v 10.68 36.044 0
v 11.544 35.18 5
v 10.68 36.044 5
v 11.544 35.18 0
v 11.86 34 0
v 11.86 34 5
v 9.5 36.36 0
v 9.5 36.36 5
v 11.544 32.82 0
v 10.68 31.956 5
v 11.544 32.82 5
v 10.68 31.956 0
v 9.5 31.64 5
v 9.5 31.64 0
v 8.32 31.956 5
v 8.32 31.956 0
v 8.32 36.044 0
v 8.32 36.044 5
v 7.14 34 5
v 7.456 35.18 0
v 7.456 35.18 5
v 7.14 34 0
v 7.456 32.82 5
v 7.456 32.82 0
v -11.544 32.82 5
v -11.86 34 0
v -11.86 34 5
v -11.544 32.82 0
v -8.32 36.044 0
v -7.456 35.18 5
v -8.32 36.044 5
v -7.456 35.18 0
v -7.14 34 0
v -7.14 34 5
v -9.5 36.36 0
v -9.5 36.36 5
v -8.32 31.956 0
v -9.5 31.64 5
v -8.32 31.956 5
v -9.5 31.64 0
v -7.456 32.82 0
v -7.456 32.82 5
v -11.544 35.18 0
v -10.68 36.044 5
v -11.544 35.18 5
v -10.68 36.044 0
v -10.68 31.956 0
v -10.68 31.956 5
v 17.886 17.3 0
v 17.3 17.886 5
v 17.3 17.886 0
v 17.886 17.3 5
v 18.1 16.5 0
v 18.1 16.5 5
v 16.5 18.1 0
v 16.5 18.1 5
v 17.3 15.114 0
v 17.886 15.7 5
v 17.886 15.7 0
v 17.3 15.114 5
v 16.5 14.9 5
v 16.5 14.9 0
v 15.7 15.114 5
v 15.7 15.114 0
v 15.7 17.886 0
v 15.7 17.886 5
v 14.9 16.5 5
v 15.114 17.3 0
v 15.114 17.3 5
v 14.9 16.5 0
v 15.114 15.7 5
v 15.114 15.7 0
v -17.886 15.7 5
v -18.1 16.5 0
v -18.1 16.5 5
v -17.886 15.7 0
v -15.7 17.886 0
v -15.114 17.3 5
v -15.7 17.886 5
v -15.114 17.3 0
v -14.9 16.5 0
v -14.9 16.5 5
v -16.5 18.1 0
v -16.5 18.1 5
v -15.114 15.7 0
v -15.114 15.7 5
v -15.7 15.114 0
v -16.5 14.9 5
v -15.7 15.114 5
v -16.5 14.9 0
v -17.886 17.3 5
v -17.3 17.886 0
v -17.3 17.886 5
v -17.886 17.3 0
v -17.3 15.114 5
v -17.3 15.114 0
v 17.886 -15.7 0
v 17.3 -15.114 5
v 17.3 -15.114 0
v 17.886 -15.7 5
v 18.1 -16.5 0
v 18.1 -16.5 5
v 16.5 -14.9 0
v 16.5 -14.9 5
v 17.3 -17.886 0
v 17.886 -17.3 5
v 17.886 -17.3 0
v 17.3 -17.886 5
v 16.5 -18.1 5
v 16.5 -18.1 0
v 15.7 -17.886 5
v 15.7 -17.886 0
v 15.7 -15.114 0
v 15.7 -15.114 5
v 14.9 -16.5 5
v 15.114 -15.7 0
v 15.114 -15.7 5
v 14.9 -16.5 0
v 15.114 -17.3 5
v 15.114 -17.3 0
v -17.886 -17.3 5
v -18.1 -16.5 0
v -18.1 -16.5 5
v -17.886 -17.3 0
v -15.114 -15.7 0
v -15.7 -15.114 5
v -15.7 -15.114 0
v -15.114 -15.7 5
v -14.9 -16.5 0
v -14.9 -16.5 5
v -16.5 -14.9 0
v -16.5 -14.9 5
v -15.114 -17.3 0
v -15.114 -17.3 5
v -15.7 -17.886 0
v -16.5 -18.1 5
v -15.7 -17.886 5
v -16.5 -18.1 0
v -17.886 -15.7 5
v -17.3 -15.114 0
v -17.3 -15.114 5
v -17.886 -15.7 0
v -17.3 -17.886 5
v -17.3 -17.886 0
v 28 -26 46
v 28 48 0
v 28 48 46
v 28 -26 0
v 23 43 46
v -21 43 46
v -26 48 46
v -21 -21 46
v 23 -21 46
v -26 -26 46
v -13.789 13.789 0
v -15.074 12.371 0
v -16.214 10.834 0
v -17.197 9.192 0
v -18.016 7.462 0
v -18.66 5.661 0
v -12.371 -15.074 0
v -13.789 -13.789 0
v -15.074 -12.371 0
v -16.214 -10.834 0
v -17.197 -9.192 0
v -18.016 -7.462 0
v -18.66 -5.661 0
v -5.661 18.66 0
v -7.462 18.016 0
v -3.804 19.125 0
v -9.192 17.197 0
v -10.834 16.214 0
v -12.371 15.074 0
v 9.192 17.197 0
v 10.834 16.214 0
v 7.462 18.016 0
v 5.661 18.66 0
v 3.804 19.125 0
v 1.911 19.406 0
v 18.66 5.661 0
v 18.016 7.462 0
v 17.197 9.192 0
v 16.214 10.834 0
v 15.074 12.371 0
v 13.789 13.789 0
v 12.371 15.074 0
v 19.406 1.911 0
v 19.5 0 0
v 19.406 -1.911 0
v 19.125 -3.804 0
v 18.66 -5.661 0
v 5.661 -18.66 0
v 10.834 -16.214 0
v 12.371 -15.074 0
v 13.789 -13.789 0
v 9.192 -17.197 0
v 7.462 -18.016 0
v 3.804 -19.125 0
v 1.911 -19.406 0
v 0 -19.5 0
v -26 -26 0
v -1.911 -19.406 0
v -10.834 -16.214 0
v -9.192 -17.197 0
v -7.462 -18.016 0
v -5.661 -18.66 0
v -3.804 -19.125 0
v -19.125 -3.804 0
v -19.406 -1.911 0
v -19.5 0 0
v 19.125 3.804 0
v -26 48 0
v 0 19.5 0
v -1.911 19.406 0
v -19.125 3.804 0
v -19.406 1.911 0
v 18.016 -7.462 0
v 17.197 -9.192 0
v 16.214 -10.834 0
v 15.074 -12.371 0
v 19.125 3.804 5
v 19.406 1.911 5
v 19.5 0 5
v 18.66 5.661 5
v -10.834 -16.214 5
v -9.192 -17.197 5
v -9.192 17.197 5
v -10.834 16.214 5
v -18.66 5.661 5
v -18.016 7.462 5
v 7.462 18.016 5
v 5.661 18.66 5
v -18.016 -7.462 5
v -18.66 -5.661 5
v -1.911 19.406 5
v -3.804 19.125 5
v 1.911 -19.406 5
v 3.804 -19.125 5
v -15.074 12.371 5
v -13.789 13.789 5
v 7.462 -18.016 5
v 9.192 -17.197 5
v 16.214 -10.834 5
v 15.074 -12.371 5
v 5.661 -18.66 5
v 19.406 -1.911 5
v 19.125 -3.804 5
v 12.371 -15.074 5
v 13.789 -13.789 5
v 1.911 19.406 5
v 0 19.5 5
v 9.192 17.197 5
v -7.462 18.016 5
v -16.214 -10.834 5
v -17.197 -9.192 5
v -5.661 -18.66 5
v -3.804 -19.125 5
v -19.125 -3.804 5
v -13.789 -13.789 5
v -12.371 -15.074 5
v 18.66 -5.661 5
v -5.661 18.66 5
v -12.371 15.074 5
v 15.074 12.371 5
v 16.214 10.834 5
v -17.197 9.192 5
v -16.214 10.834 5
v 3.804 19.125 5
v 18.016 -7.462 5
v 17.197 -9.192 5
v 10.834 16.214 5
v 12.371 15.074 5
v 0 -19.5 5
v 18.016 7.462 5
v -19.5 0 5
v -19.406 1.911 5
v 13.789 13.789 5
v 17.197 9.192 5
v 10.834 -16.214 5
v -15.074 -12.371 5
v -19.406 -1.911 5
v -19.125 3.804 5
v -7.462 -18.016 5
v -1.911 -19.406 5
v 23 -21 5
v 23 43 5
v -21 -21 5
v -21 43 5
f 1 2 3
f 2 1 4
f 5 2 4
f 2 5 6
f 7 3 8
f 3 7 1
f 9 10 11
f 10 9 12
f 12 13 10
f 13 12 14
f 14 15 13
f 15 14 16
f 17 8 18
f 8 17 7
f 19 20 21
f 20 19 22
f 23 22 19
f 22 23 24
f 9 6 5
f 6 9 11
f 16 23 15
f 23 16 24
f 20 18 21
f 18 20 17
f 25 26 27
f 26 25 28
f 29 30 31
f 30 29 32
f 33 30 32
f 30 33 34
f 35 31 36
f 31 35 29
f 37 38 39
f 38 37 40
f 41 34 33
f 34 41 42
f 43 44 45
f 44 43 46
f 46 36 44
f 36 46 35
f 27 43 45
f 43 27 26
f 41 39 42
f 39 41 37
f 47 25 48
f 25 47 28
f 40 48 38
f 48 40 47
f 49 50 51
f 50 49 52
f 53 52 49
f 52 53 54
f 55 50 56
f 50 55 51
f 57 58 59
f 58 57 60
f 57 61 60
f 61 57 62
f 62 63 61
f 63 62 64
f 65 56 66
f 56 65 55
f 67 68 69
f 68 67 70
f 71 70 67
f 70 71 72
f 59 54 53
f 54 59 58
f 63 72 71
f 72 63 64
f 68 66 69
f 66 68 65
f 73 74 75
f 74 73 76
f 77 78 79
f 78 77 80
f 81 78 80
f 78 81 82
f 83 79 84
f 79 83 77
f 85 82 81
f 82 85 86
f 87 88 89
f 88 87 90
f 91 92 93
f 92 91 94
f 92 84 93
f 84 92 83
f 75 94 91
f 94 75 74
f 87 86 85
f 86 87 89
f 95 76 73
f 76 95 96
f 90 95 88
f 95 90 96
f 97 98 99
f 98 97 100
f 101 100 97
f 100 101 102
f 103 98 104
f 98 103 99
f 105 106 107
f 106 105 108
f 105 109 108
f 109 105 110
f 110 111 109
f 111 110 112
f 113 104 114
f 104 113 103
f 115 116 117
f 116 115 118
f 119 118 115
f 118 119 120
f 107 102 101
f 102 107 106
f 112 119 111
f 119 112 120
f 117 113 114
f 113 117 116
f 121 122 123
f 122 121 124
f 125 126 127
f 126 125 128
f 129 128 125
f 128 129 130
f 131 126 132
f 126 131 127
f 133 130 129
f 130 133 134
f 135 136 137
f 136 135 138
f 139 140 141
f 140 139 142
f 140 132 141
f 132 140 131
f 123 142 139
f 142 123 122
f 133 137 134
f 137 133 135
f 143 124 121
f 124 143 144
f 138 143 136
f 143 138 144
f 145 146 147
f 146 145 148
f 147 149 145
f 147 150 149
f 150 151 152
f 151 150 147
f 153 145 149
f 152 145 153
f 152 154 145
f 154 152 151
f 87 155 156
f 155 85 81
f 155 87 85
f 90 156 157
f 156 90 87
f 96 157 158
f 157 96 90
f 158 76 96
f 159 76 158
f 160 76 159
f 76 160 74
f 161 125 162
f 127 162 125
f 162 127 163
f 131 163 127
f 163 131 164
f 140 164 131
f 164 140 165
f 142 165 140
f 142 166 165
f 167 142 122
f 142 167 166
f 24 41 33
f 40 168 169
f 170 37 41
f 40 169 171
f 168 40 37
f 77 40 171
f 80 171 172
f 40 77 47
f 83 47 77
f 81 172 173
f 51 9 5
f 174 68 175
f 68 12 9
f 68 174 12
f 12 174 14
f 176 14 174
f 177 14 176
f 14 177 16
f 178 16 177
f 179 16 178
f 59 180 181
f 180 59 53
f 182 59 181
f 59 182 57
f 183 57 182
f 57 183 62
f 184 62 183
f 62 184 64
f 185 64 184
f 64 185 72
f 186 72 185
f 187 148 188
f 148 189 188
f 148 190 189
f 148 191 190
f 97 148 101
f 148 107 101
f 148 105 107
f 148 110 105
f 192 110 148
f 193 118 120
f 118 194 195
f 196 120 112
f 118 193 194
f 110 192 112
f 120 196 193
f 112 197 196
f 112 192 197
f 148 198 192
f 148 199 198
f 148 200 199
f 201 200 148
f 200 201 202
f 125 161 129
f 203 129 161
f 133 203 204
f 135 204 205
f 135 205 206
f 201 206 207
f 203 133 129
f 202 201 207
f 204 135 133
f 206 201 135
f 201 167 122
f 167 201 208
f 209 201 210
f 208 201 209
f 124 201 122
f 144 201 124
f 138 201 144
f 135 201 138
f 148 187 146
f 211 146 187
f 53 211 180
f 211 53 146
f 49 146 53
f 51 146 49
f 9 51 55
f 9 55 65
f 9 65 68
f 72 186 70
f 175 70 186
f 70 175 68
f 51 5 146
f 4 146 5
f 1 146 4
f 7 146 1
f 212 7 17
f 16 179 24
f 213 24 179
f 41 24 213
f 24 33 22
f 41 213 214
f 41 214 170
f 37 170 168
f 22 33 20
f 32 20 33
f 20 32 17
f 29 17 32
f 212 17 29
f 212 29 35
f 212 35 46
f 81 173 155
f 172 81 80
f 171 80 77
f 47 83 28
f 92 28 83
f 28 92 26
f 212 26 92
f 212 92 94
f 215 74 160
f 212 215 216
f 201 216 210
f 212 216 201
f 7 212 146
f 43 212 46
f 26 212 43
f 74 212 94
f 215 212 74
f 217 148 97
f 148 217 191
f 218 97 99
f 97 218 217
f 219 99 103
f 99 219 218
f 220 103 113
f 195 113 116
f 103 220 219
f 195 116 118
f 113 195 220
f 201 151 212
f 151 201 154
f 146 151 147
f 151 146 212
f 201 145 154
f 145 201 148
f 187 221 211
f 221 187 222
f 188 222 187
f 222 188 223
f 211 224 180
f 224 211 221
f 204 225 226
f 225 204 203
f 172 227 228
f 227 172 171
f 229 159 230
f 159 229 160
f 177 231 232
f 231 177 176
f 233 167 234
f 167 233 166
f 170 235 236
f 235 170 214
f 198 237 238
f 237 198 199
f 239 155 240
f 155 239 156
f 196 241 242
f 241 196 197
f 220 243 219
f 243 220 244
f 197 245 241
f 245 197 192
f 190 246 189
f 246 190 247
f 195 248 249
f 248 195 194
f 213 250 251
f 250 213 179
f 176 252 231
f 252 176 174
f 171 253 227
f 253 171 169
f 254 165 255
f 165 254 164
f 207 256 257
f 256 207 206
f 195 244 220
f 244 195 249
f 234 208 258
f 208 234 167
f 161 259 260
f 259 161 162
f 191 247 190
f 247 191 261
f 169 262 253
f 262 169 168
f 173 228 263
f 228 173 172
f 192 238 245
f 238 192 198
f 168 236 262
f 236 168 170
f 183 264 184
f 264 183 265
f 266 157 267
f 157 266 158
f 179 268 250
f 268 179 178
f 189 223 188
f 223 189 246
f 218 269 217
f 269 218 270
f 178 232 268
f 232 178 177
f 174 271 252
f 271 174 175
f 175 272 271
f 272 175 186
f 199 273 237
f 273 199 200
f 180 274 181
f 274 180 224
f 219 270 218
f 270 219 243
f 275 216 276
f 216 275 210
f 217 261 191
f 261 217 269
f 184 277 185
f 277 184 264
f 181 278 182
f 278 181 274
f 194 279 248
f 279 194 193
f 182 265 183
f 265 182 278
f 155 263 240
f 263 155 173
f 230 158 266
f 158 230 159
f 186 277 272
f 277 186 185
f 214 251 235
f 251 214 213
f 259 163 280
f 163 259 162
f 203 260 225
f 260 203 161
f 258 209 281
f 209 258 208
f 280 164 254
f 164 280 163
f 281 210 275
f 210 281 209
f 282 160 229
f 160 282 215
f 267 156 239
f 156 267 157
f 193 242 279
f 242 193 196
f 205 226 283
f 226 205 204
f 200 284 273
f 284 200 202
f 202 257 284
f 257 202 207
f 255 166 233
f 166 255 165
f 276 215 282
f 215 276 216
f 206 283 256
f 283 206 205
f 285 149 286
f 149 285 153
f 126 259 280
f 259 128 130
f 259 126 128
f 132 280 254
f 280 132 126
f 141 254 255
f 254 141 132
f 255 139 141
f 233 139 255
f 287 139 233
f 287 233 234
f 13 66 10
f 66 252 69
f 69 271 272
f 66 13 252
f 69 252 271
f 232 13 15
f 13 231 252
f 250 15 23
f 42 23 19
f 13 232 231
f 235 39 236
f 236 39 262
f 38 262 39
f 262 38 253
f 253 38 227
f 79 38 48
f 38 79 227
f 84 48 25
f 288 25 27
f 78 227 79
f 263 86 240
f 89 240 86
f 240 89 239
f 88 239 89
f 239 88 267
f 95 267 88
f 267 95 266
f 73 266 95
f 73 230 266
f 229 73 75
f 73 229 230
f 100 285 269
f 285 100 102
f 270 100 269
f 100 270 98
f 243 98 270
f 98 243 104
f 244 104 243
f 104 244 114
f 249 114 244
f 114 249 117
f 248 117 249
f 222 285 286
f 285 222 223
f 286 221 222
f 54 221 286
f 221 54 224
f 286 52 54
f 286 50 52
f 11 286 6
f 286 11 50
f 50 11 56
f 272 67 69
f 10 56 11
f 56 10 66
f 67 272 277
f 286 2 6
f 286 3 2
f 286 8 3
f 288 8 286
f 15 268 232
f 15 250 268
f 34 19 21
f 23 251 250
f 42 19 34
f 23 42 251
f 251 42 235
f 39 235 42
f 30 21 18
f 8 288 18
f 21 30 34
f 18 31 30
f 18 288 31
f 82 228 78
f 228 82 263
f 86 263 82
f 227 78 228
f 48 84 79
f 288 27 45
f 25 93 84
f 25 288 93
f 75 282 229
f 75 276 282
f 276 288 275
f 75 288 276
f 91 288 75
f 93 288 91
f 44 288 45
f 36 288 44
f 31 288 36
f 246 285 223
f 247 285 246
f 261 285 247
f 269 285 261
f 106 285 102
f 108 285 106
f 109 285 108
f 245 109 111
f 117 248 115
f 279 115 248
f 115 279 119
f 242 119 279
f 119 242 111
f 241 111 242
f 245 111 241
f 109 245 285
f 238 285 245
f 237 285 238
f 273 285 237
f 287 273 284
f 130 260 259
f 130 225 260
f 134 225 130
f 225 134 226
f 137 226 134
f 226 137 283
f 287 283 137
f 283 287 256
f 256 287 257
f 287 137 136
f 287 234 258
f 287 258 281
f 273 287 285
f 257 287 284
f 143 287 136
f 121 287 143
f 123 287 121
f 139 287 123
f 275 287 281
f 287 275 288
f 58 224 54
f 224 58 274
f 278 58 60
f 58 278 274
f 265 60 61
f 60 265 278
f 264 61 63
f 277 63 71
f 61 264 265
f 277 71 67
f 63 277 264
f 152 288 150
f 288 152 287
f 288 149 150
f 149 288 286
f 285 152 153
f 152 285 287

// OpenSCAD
difference() {
    translate([-26,-26,0]) {
        cube([54,74,46]);
    }
    cylinder($fn=64,300,19.5,19.5,true);
    translate ([-21,-21,5]) {
        cube([44,64,44]);
    }
    translate ([0,34,0]) {
        translate ([9.5,0,0]) {
            cylinder($fn=12,300,2.36,2.36,true);
        }
        translate ([-9.5,0,0]) {
            cylinder($fn=12,300,2.36,2.36,true);
        }
    }
    translate ([0,16.5,0]) {
        translate ([16.5,0,0]) {
            cylinder($fn=12,300,1.6,1.6,true);
        }
        translate ([-16.5,0,0]) {
            cylinder($fn=12,300,1.6,1.6,true);
        }
    }
    translate ([0,-16.5,0]) {
        translate ([16.5,0,0]) {
            cylinder($fn=12,300,1.6,1.6,true);
        }
        translate ([-16.5,0,0]) {
            cylinder($fn=12,300,1.6,1.6,true);
        }
    }
}
